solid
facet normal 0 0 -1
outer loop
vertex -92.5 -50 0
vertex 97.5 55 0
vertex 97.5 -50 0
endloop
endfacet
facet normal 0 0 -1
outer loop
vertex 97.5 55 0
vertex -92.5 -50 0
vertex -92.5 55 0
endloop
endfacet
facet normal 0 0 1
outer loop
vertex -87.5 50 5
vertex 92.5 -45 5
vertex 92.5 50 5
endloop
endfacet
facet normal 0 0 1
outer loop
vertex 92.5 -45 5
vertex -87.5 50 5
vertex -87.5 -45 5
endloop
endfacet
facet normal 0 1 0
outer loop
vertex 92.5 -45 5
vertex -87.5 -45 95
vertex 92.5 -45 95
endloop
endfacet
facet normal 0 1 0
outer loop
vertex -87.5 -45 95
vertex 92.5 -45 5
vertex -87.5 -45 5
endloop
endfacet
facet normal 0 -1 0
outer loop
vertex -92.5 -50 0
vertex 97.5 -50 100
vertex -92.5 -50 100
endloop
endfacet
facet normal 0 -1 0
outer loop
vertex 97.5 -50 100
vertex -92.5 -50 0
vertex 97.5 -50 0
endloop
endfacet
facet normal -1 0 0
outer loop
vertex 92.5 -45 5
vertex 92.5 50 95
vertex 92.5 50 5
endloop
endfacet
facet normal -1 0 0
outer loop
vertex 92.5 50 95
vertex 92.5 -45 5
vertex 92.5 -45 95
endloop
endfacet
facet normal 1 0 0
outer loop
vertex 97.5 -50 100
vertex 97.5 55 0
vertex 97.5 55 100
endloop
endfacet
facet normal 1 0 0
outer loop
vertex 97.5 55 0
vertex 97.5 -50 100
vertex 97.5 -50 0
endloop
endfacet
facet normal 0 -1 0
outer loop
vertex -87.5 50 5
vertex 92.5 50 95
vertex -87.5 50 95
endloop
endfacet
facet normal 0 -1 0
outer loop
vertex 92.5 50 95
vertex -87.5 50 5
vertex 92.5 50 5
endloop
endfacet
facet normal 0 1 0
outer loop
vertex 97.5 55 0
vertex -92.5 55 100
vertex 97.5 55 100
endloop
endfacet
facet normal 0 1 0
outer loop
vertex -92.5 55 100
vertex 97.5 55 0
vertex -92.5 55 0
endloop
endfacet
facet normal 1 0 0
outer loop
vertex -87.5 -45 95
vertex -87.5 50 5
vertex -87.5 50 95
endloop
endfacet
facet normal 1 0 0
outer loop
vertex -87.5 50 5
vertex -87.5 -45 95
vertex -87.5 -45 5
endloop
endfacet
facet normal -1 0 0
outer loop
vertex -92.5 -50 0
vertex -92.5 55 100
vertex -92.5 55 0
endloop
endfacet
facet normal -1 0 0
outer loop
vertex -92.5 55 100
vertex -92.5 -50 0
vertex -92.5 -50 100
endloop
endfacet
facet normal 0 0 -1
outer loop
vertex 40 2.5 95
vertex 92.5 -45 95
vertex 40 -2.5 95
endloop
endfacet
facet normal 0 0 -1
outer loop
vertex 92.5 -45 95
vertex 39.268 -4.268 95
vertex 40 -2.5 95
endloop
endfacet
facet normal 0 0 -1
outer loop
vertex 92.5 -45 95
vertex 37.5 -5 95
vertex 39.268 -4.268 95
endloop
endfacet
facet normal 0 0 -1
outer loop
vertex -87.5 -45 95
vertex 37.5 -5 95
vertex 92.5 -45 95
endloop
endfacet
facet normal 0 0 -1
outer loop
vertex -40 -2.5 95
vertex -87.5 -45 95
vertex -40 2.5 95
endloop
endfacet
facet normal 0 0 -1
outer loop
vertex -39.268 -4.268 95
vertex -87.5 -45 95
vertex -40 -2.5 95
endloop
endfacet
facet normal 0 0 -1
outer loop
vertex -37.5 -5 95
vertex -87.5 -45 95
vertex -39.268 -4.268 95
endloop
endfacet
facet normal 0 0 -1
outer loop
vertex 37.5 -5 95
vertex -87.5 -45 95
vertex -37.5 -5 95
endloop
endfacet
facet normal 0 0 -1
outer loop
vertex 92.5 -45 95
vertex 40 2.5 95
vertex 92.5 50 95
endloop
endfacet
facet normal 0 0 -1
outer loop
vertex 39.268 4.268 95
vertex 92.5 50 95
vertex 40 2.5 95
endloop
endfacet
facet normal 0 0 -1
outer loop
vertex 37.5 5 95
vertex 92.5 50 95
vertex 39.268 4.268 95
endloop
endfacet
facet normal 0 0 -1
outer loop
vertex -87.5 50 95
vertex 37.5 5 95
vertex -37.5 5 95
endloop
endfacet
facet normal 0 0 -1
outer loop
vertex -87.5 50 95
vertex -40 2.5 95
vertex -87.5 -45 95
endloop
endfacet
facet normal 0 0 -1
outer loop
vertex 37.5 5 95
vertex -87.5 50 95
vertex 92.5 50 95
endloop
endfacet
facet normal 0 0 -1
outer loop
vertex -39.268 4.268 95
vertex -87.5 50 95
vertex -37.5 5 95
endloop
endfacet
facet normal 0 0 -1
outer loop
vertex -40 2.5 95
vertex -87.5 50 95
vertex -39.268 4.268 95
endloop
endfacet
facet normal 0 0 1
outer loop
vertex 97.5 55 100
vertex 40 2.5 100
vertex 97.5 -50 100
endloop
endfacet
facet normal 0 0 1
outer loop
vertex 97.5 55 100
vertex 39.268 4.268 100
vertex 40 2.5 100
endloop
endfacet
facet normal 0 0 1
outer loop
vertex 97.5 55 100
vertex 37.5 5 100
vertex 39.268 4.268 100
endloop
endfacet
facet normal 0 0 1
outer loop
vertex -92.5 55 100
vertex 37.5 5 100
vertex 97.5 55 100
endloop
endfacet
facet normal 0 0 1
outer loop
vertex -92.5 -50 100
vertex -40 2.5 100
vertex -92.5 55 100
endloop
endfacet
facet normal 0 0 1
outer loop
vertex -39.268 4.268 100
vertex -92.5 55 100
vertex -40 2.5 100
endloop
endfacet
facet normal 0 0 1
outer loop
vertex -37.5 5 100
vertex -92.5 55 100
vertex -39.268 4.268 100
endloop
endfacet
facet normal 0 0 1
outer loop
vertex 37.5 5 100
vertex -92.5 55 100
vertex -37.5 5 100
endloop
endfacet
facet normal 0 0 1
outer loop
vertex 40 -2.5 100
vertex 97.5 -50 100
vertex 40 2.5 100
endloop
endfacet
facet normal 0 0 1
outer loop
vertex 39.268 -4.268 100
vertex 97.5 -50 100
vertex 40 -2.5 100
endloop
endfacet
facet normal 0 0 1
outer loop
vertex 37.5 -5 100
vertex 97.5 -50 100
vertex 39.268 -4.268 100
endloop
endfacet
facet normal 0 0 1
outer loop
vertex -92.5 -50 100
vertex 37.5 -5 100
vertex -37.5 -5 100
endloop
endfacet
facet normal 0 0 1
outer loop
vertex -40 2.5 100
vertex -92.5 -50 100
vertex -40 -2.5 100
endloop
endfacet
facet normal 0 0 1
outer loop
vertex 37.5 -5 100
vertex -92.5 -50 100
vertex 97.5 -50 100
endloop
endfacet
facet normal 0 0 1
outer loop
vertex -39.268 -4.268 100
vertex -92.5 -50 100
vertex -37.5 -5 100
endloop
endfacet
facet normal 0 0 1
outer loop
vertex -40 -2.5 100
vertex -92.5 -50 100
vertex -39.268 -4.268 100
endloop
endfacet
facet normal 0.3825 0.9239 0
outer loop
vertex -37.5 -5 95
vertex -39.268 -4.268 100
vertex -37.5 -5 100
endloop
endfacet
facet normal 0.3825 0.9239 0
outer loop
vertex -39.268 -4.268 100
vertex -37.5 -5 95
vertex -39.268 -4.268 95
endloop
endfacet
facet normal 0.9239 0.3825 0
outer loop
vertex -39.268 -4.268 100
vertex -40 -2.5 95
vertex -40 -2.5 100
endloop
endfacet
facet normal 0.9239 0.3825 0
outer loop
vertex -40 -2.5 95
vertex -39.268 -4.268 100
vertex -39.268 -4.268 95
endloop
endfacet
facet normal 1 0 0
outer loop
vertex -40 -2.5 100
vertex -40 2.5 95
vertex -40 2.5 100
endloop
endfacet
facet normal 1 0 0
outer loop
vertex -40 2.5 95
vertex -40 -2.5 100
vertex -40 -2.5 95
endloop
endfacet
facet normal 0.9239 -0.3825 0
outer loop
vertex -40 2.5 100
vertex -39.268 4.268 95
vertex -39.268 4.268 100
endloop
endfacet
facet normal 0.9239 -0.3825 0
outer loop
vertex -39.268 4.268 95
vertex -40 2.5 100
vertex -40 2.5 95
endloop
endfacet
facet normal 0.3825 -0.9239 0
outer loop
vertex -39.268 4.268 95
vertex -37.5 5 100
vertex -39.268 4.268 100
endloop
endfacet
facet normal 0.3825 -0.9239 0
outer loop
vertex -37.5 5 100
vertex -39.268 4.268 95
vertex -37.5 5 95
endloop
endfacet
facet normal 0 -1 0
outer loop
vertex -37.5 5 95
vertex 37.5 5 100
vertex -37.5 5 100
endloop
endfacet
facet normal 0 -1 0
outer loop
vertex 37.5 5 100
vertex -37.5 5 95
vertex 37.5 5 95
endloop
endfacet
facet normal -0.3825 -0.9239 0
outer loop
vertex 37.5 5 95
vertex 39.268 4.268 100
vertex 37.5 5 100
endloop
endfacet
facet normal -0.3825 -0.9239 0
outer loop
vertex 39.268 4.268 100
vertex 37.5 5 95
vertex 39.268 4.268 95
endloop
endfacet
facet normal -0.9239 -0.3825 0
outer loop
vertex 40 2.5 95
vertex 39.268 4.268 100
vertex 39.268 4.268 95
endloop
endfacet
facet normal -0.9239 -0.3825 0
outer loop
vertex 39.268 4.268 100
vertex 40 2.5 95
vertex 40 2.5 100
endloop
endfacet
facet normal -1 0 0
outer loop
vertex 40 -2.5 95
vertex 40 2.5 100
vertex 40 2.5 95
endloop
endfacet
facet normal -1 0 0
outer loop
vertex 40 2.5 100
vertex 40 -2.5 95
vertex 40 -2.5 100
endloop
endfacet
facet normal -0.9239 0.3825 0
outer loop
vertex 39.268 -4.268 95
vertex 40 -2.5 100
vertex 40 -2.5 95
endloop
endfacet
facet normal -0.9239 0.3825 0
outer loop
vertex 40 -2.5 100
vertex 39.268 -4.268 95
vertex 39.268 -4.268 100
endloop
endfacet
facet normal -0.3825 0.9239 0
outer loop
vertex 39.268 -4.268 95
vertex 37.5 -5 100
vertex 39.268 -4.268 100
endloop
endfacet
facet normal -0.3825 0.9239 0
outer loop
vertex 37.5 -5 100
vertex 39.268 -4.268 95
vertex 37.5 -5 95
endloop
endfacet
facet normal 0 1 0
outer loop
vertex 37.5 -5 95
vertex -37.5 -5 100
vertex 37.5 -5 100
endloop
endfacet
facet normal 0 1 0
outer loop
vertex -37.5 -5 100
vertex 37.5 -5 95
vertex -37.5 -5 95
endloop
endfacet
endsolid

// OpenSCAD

Hauteur                         = 100;
Largeur                         = 185;
Profondeur                      = 100;
EpaisseurPlanches               = 5;

NombreSubdivisionsHauteur       = 5;
NombreSubdivisionsLargeur       = 2;
NombreSubdivisionsProfondeur    = 2;

BoiteFermee                     = "oui";//[oui,non]


Fente                           = "oui";//[oui,non]
HauteurFente                    = 10;
LargeurFente                    = 80;
ArrondiCoins                    = 5;

modevision                      = "boite";//[boite,DXF]

SubH = Hauteur/((2*NombreSubdivisionsHauteur)+1);
SubL = (Largeur)/((2*NombreSubdivisionsLargeur)+1);
SubP = Profondeur/((2*NombreSubdivisionsProfondeur)+1);
SubP2 = (Profondeur-EpaisseurPlanches)/((2*NombreSubdivisionsProfondeur)+1);


objet();

module objet()
{
if(modevision=="boite")
{
    boite();
}
if(modevision=="DXF")
{
    DXFF();
}
}
module DXFF()
{
translate([-Largeur/2-EpaisseurPlanches,-Hauteur/2-EpaisseurPlanches])cotesun();
translate([Profondeur/2+EpaisseurPlanches,-Hauteur/2-EpaisseurPlanches])cotesdeux();   
translate([-Largeur/2-EpaisseurPlanches,Hauteur/2+EpaisseurPlanches])cotesun();
translate([Profondeur/2+EpaisseurPlanches,Hauteur/2+EpaisseurPlanches])cotesdeux();
translate([EpaisseurPlanches+Largeur/2,Hauteur+Profondeur/2+EpaisseurPlanches*2]) dessous();
if(BoiteFermee=="oui")
{
translate([-Largeur/2-EpaisseurPlanches,Hauteur+Profondeur/2+EpaisseurPlanches*2]) dessus();  
}
}

module boite()
{
color("red")
linear_extrude(height=EpaisseurPlanches)
dessous();
if(BoiteFermee=="oui")
{
color([1,0,0,1])
translate([0,0,Hauteur-EpaisseurPlanches])
linear_extrude(height=EpaisseurPlanches)
dessus();
}


color("green")
rotate([90,0,0])
translate([0,Hauteur/2,Profondeur/2])
rotate([180,0,0])
linear_extrude(height=EpaisseurPlanches)
cotesun();

color("green")
rotate([90,0,0])
translate([EpaisseurPlanches,Hauteur/2,-Profondeur/2-EpaisseurPlanches])
rotate([0,0,180])
linear_extrude(height=EpaisseurPlanches)
cotesun();

color("blue")
rotate([90,0,90])
translate([0,Hauteur/2,Largeur/2])
linear_extrude(height=EpaisseurPlanches)
cotesdeux();

color("blue")
rotate([90,0,-90])
translate([-EpaisseurPlanches,Hauteur/2,Largeur/2-EpaisseurPlanches])
linear_extrude(height=EpaisseurPlanches)
cotesdeux();
}

module cotesun()
{
    difference()
    {
        union()
        {
            square([Largeur,Hauteur],center=true);
            for(i=[-NombreSubdivisionsHauteur:2:NombreSubdivisionsHauteur])
            {
                translate([Largeur/2,SubH*i,0])
                square([EpaisseurPlanches*2,SubH],center=true);
            }
        }
        for(i=[-NombreSubdivisionsHauteur:2:NombreSubdivisionsHauteur])
        {
            translate([-Largeur/2,SubH*i,0])
            square([EpaisseurPlanches*2,SubH],center=true);
        }
        
        for(i=[-NombreSubdivisionsLargeur+1:2:NombreSubdivisionsLargeur-1])
        {
            translate([EpaisseurPlanches/2,0])
            translate([(((Largeur-1*EpaisseurPlanches)/((2*NombreSubdivisionsLargeur)+1))*i),Hauteur/2])
            square([(Largeur-1*EpaisseurPlanches)/((2*NombreSubdivisionsLargeur)+1),EpaisseurPlanches*2],center=true);
        }
if(BoiteFermee=="oui")
    
        for(i=[-NombreSubdivisionsLargeur+1:2:NombreSubdivisionsLargeur-1])
        {
            translate([EpaisseurPlanches/2,0])
            translate([(((Largeur-1*EpaisseurPlanches)/((2*NombreSubdivisionsLargeur)+1))*i),-Hauteur/2])
            square([(Largeur-1*EpaisseurPlanches)/((2*NombreSubdivisionsLargeur)+1),EpaisseurPlanches*2],center=true);
        }

    }
}






module cotesdeux()
{
difference()
    {
    union()
    {
        square([Profondeur,Hauteur],center=true);
        for(i=[-NombreSubdivisionsHauteur:2:NombreSubdivisionsHauteur])
        {
            translate([Profondeur/2,SubH*i,0])
            square([EpaisseurPlanches*2,SubH],center=true);
        }
 
    }
    for(i=[-NombreSubdivisionsHauteur:2:NombreSubdivisionsHauteur])
    {
        translate([-Profondeur/2,SubH*i,0])
        square([EpaisseurPlanches*2,SubH],center=true);
    }
    for(i=[-NombreSubdivisionsProfondeur+1:2:NombreSubdivisionsProfondeur-1])
    {
        translate([EpaisseurPlanches/2,0])
        translate([(((Profondeur-1*EpaisseurPlanches)/((2*NombreSubdivisionsProfondeur)+1))*i),-Hauteur/2])
        square([(Profondeur-1*EpaisseurPlanches)/((2*NombreSubdivisionsProfondeur)+1),EpaisseurPlanches*2],center=true);
    }
    if(BoiteFermee=="oui")
    {
    for(i=[-NombreSubdivisionsProfondeur+1:2:NombreSubdivisionsProfondeur-1])
    {
        translate([EpaisseurPlanches/2,0])
        translate([(((Profondeur-1*EpaisseurPlanches)/((2*NombreSubdivisionsProfondeur)+1))*i),Hauteur/2])
        square([(Profondeur-1*EpaisseurPlanches)/((2*NombreSubdivisionsProfondeur)+1),EpaisseurPlanches*2],center=true);
    }
}
    
    }
}







module dessous()
{
    tailleX=Largeur-(EpaisseurPlanches);
    tailleY=Profondeur-(EpaisseurPlanches);
    union()
    {
        translate([EpaisseurPlanches/2,EpaisseurPlanches/2])
        square([tailleX,tailleY],center=true);
        for(i=[-NombreSubdivisionsLargeur+1:2:NombreSubdivisionsLargeur-1])
        {
            translate([EpaisseurPlanches/2,0])
            translate([(((Largeur-1*EpaisseurPlanches)/((2*NombreSubdivisionsLargeur)+1))*i),-Profondeur/2+EpaisseurPlanches])
            square([(Largeur-1*EpaisseurPlanches)/((2*NombreSubdivisionsLargeur)+1),EpaisseurPlanches*2],center=true);
        }
        for(i=[-NombreSubdivisionsLargeur+1:2:NombreSubdivisionsLargeur-1])
        {
            translate([EpaisseurPlanches/2,0])
            translate([(((Largeur-1*EpaisseurPlanches)/((2*NombreSubdivisionsLargeur)+1))*i),Profondeur/2])
            square([(Largeur-1*EpaisseurPlanches)/((2*NombreSubdivisionsLargeur)+1),EpaisseurPlanches*2],center=true);
        }
        for(i=[-NombreSubdivisionsProfondeur+1:2:NombreSubdivisionsProfondeur-1])
        {
            translate([Largeur/2,EpaisseurPlanches/2])
            translate([0,i*SubP2])
            square([EpaisseurPlanches*2,SubP2],center=true);
        }
        for(i=[-NombreSubdivisionsProfondeur+1:2:NombreSubdivisionsProfondeur-1])
        {
            translate([-Largeur/2+EpaisseurPlanches,EpaisseurPlanches/2])
            translate([0,i*SubP2])
            square([EpaisseurPlanches*2,SubP2],center=true);
        }
    }
}


module dessus()
{
    tailleX=Largeur-(EpaisseurPlanches);
    tailleY=Profondeur-(EpaisseurPlanches);
    difference()
    {
        union()
        {
            translate([EpaisseurPlanches/2,EpaisseurPlanches/2])
            square([tailleX,tailleY],center=true);
            for(i=[-NombreSubdivisionsLargeur+1:2:NombreSubdivisionsLargeur-1])
            {
                translate([EpaisseurPlanches/2,0])
                translate([(((Largeur-1*EpaisseurPlanches)/((2*NombreSubdivisionsLargeur)+1))*i),-Profondeur/2+EpaisseurPlanches])
                square([(Largeur-1*EpaisseurPlanches)/((2*NombreSubdivisionsLargeur)+1),EpaisseurPlanches*2],center=true);
            }
            for(i=[-NombreSubdivisionsLargeur+1:2:NombreSubdivisionsLargeur-1])
            {
                translate([EpaisseurPlanches/2,0])
                translate([(((Largeur-1*EpaisseurPlanches)/((2*NombreSubdivisionsLargeur)+1))*i),Profondeur/2])
                square([(Largeur-1*EpaisseurPlanches)/((2*NombreSubdivisionsLargeur)+1),EpaisseurPlanches*2],center=true);
            }
            for(i=[-NombreSubdivisionsProfondeur+1:2:NombreSubdivisionsProfondeur-1])
            {
                translate([Largeur/2,EpaisseurPlanches/2])
                translate([0,i*SubP2])
                square([EpaisseurPlanches*2,SubP2],center=true);
            }
            for(i=[-NombreSubdivisionsProfondeur+1:2:NombreSubdivisionsProfondeur-1])
            {
                translate([-Largeur/2+EpaisseurPlanches,EpaisseurPlanches/2])
                translate([0,i*SubP2])
                square([EpaisseurPlanches*2,SubP2],center=true);
            }
        }
        if(Fente=="oui")
        {
        hull()
        {
            translate([LargeurFente/2-ArrondiCoins/2,HauteurFente/2-ArrondiCoins/2])
            circle(r=ArrondiCoins/2);
    
            translate([LargeurFente/2-ArrondiCoins/2,-HauteurFente/2+ArrondiCoins/2])
            circle(r=ArrondiCoins/2);
    
            translate([-LargeurFente/2+ArrondiCoins/2,HauteurFente/2-ArrondiCoins/2])
            circle(r=ArrondiCoins/2);
    
            translate([-LargeurFente/2+ArrondiCoins/2,-HauteurFente/2+ArrondiCoins/2])
            circle(r=ArrondiCoins/2);
        }
    }
        
        
    }
}




